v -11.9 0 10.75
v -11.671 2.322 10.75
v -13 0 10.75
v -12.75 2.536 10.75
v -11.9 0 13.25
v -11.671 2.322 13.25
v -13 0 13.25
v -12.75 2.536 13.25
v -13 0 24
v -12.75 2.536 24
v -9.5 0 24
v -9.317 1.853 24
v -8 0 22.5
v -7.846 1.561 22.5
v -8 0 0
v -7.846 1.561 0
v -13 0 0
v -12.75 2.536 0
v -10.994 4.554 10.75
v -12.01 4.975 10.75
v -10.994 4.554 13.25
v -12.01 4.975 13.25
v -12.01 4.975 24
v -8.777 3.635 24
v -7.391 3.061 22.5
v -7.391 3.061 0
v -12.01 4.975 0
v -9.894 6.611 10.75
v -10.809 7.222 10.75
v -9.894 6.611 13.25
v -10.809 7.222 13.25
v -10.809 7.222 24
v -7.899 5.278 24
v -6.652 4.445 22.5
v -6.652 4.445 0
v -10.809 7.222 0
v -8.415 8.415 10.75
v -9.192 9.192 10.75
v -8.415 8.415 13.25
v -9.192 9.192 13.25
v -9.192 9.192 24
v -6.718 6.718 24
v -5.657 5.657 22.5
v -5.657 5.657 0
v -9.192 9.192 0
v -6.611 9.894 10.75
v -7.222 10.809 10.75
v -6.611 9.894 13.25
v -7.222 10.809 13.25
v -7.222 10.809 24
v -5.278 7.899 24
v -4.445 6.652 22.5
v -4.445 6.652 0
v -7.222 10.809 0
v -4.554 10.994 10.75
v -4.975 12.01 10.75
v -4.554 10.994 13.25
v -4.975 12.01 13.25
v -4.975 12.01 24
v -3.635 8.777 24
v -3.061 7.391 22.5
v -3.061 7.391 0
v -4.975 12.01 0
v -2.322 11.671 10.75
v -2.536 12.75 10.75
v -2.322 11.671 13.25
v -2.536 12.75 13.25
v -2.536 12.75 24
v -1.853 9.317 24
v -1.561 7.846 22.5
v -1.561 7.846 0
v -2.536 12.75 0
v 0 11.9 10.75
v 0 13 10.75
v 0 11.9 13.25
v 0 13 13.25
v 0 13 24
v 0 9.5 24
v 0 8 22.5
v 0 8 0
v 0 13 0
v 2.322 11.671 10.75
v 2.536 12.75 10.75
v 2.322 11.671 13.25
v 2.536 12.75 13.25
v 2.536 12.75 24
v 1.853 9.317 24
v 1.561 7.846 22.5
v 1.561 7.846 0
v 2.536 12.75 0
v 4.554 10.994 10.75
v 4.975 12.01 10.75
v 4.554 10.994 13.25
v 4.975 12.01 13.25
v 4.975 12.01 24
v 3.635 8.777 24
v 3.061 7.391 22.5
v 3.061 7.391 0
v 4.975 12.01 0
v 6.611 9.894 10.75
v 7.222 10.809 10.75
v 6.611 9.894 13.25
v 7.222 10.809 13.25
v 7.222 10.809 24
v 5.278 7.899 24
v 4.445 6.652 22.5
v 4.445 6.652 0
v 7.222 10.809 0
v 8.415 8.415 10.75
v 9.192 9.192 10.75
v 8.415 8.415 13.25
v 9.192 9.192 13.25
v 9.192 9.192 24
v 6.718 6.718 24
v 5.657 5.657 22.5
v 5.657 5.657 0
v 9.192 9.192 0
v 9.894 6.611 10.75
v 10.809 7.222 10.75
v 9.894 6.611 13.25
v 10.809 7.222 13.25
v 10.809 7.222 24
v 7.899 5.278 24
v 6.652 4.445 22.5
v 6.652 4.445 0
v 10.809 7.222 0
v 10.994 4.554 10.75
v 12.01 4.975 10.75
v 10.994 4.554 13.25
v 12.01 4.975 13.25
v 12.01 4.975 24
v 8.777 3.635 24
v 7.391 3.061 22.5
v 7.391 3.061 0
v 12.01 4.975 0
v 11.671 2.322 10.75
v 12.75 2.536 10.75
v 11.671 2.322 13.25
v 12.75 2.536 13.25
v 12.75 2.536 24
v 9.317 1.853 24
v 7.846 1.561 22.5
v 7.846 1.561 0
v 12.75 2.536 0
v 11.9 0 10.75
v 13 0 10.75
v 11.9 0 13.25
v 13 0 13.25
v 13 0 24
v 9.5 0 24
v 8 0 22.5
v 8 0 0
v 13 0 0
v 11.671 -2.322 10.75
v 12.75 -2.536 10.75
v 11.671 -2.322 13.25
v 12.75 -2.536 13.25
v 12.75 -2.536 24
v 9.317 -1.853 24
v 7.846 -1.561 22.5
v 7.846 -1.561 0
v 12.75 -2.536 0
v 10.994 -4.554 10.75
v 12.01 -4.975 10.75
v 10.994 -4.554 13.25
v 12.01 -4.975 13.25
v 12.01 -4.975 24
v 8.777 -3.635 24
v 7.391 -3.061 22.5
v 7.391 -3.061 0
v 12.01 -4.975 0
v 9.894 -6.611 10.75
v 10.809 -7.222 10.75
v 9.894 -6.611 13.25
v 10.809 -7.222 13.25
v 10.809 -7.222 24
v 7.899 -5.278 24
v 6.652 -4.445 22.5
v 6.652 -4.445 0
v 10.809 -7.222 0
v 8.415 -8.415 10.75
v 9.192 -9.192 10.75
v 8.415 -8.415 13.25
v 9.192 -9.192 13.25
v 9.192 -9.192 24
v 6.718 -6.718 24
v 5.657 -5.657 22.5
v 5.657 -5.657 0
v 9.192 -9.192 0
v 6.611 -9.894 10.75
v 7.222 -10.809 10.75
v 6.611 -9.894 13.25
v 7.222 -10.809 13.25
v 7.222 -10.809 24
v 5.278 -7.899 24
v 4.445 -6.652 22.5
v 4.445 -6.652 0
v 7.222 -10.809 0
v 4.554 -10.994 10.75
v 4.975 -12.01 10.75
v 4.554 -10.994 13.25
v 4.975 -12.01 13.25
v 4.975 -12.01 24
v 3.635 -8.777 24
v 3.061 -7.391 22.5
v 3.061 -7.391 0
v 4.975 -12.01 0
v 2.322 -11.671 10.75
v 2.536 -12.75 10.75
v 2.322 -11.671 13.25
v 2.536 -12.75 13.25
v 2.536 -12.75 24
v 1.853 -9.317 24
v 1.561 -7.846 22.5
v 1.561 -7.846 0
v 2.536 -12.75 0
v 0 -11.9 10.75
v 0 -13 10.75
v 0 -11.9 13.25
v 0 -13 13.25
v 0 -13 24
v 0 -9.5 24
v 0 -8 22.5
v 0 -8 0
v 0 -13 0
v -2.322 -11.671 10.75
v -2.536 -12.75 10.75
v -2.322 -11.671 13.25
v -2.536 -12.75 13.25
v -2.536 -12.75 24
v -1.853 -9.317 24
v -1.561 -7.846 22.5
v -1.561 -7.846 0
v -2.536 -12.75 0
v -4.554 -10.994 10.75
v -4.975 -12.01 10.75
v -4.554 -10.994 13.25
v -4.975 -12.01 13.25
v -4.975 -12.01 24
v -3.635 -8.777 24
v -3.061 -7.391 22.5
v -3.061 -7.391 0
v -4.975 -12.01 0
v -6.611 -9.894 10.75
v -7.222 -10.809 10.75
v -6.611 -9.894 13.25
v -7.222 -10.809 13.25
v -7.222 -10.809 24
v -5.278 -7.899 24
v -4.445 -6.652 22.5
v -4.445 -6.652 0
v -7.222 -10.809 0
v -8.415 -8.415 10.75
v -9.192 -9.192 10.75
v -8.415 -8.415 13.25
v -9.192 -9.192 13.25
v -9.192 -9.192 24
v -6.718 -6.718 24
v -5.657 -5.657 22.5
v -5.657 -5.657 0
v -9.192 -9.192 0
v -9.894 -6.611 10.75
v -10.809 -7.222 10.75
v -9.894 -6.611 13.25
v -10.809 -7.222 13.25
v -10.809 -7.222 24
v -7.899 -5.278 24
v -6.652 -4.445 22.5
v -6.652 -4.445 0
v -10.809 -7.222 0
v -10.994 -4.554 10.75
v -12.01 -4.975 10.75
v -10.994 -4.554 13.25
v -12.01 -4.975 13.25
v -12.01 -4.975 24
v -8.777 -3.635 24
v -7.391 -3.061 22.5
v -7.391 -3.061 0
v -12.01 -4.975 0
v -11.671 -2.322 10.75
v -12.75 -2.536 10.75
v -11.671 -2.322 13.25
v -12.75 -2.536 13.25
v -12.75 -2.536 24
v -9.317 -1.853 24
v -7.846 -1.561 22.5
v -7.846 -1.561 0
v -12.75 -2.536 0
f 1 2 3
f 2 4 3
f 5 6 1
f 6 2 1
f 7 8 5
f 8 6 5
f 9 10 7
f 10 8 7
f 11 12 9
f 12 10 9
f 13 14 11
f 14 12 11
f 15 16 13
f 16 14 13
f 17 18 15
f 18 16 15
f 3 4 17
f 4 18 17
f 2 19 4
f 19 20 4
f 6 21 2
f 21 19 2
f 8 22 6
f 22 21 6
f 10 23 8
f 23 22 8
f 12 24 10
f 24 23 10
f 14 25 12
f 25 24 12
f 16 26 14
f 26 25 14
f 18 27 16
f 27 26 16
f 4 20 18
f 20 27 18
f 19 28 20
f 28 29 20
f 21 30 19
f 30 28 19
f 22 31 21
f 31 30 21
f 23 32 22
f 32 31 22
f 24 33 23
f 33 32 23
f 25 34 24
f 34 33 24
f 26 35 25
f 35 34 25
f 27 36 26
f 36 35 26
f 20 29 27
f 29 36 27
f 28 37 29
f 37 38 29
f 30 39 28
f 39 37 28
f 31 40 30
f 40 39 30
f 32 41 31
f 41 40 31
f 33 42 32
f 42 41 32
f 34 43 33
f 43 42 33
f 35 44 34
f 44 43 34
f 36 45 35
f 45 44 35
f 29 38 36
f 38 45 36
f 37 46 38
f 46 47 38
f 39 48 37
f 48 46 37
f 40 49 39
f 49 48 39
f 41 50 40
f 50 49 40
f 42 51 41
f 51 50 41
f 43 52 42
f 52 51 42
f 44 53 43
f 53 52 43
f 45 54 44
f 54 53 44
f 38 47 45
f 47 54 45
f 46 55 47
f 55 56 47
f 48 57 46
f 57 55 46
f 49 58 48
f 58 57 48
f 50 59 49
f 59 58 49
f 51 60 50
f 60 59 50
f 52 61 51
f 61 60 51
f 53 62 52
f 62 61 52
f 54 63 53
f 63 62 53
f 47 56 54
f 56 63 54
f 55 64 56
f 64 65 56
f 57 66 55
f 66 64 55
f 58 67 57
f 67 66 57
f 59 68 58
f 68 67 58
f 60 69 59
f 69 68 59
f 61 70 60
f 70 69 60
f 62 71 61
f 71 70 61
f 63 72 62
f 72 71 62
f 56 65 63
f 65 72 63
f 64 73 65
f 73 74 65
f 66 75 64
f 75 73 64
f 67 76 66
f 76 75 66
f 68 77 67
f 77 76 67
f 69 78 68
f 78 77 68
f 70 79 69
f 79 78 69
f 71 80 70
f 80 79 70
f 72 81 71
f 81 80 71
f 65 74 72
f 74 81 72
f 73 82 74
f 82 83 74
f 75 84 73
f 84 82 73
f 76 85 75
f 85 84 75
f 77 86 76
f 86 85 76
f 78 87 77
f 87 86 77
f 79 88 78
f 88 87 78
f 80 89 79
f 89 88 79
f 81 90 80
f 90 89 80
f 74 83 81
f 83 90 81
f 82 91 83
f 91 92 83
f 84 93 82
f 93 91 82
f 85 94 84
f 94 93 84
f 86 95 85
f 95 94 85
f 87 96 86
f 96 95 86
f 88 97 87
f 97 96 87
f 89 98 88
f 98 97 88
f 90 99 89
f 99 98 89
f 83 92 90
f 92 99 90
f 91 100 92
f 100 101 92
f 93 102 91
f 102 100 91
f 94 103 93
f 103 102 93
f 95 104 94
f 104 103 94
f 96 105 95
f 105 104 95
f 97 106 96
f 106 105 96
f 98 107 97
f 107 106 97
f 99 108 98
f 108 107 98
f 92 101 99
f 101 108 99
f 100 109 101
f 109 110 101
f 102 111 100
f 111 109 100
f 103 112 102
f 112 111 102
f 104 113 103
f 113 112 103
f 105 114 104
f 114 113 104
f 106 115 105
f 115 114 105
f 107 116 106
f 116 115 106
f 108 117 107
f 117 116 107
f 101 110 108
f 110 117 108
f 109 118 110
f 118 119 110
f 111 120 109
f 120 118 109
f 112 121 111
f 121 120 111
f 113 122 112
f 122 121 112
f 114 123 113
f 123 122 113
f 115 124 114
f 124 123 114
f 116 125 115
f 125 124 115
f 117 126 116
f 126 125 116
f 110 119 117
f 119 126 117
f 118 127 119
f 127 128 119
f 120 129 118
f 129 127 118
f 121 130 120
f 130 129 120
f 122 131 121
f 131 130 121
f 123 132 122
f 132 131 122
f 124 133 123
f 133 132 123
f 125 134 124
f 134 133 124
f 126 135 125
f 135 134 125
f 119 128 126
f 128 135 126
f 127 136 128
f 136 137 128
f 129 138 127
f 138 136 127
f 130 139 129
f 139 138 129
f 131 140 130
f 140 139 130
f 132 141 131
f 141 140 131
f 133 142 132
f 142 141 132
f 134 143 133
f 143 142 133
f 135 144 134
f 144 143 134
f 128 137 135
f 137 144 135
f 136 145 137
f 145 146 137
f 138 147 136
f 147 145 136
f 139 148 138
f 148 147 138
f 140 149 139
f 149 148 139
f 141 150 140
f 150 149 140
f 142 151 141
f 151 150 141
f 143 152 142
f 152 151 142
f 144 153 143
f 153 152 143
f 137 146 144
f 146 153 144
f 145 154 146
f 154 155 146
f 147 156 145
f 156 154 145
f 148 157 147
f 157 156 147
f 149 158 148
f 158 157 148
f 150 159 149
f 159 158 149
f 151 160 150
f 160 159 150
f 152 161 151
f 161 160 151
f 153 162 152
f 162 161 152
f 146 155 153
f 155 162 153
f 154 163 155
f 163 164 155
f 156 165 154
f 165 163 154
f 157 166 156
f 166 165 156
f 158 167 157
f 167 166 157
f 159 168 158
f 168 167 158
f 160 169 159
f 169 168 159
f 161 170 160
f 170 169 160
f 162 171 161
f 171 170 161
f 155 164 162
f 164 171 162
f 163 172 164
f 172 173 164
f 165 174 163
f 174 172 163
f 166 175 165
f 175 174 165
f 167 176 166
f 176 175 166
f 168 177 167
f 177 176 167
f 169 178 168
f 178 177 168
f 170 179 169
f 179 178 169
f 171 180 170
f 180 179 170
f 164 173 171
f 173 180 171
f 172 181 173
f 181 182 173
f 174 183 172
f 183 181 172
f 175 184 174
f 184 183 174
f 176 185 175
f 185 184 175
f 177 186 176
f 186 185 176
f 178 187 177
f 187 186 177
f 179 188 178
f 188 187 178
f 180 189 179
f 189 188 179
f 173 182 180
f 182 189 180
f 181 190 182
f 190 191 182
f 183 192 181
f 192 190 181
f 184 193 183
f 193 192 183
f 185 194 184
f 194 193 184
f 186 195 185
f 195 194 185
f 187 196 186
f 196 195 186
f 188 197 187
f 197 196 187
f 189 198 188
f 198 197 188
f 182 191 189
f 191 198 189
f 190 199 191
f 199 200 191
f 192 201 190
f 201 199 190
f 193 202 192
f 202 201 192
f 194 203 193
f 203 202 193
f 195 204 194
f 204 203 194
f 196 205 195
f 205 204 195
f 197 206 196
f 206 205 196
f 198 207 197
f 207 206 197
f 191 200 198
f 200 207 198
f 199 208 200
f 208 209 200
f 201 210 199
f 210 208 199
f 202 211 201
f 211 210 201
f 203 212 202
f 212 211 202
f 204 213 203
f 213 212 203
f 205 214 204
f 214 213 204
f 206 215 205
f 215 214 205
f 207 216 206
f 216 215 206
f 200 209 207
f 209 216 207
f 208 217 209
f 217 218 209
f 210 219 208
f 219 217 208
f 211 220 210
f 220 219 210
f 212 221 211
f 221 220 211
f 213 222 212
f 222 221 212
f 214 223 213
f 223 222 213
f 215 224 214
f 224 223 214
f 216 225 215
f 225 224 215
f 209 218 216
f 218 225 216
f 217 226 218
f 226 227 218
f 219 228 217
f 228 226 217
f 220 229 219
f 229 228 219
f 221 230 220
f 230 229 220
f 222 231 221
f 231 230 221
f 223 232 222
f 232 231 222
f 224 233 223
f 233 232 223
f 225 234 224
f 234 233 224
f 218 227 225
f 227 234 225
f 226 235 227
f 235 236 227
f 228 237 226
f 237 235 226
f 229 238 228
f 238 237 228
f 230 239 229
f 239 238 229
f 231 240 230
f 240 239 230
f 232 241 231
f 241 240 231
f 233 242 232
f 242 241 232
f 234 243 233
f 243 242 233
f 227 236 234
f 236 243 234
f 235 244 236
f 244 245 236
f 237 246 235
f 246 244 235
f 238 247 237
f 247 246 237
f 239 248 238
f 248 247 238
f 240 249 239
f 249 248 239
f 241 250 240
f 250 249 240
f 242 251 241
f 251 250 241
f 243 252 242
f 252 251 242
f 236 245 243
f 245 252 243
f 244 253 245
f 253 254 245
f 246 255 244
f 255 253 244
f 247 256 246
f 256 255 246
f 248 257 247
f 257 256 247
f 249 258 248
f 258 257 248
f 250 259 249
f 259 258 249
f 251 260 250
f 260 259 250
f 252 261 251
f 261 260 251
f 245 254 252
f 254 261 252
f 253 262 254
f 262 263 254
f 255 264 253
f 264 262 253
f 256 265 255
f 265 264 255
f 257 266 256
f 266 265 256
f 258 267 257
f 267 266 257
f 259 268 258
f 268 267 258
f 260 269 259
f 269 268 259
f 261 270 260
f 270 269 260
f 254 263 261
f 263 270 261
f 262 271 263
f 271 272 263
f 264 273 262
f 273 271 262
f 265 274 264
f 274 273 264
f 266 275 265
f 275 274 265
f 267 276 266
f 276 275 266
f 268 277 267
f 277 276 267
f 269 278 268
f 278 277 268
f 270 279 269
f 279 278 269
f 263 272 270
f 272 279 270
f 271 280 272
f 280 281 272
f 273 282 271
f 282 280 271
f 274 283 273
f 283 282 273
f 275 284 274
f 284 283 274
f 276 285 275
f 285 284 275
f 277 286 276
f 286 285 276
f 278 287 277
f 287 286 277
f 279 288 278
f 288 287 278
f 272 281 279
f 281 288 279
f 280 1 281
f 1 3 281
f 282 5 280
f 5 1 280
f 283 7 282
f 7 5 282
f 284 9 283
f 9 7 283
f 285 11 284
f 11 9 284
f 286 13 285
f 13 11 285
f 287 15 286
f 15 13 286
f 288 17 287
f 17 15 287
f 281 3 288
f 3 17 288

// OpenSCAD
$fn = 32;

// ----------------------------------------------------------------------
// Grooved revolve: thread_relief, bore R8
// ----------------------------------------------------------------------

// --- parameters (mm) ---
bore_r = 8;               // bore radius
outer_r = 13;             // outer radius of the body
total_h = 24;             // overall height, Z
wall = 5;                 // radial wall thickness
groove_w = 2.5;           // groove width
groove_d = 1.1;           // groove depth
grooves = 1;              // number of outer grooves
relief = 1.5;             // thread relief leg at the bore mouth
relief_angle = 45;        // thread relief chamfer angle, degrees

bbox_x = 2 * outer_r;  // full diameter
bore_d = 2 * bore_r;  // bore diameter
body_d = 2 * outer_r;  // body diameter
revolve_angle = 360;  // full turn around the Z axis

profile = [[8, 0], [13, 0], [13, 10.75], [11.9, 10.75], [11.9, 13.25], [13, 13.25], [13, 24], [9.5, 24], [8, 22.5]];  // primary outline, 9 points, counter clockwise

// --- the one profile operation ---
rotate_extrude(angle = revolve_angle) polygon(points = profile);
